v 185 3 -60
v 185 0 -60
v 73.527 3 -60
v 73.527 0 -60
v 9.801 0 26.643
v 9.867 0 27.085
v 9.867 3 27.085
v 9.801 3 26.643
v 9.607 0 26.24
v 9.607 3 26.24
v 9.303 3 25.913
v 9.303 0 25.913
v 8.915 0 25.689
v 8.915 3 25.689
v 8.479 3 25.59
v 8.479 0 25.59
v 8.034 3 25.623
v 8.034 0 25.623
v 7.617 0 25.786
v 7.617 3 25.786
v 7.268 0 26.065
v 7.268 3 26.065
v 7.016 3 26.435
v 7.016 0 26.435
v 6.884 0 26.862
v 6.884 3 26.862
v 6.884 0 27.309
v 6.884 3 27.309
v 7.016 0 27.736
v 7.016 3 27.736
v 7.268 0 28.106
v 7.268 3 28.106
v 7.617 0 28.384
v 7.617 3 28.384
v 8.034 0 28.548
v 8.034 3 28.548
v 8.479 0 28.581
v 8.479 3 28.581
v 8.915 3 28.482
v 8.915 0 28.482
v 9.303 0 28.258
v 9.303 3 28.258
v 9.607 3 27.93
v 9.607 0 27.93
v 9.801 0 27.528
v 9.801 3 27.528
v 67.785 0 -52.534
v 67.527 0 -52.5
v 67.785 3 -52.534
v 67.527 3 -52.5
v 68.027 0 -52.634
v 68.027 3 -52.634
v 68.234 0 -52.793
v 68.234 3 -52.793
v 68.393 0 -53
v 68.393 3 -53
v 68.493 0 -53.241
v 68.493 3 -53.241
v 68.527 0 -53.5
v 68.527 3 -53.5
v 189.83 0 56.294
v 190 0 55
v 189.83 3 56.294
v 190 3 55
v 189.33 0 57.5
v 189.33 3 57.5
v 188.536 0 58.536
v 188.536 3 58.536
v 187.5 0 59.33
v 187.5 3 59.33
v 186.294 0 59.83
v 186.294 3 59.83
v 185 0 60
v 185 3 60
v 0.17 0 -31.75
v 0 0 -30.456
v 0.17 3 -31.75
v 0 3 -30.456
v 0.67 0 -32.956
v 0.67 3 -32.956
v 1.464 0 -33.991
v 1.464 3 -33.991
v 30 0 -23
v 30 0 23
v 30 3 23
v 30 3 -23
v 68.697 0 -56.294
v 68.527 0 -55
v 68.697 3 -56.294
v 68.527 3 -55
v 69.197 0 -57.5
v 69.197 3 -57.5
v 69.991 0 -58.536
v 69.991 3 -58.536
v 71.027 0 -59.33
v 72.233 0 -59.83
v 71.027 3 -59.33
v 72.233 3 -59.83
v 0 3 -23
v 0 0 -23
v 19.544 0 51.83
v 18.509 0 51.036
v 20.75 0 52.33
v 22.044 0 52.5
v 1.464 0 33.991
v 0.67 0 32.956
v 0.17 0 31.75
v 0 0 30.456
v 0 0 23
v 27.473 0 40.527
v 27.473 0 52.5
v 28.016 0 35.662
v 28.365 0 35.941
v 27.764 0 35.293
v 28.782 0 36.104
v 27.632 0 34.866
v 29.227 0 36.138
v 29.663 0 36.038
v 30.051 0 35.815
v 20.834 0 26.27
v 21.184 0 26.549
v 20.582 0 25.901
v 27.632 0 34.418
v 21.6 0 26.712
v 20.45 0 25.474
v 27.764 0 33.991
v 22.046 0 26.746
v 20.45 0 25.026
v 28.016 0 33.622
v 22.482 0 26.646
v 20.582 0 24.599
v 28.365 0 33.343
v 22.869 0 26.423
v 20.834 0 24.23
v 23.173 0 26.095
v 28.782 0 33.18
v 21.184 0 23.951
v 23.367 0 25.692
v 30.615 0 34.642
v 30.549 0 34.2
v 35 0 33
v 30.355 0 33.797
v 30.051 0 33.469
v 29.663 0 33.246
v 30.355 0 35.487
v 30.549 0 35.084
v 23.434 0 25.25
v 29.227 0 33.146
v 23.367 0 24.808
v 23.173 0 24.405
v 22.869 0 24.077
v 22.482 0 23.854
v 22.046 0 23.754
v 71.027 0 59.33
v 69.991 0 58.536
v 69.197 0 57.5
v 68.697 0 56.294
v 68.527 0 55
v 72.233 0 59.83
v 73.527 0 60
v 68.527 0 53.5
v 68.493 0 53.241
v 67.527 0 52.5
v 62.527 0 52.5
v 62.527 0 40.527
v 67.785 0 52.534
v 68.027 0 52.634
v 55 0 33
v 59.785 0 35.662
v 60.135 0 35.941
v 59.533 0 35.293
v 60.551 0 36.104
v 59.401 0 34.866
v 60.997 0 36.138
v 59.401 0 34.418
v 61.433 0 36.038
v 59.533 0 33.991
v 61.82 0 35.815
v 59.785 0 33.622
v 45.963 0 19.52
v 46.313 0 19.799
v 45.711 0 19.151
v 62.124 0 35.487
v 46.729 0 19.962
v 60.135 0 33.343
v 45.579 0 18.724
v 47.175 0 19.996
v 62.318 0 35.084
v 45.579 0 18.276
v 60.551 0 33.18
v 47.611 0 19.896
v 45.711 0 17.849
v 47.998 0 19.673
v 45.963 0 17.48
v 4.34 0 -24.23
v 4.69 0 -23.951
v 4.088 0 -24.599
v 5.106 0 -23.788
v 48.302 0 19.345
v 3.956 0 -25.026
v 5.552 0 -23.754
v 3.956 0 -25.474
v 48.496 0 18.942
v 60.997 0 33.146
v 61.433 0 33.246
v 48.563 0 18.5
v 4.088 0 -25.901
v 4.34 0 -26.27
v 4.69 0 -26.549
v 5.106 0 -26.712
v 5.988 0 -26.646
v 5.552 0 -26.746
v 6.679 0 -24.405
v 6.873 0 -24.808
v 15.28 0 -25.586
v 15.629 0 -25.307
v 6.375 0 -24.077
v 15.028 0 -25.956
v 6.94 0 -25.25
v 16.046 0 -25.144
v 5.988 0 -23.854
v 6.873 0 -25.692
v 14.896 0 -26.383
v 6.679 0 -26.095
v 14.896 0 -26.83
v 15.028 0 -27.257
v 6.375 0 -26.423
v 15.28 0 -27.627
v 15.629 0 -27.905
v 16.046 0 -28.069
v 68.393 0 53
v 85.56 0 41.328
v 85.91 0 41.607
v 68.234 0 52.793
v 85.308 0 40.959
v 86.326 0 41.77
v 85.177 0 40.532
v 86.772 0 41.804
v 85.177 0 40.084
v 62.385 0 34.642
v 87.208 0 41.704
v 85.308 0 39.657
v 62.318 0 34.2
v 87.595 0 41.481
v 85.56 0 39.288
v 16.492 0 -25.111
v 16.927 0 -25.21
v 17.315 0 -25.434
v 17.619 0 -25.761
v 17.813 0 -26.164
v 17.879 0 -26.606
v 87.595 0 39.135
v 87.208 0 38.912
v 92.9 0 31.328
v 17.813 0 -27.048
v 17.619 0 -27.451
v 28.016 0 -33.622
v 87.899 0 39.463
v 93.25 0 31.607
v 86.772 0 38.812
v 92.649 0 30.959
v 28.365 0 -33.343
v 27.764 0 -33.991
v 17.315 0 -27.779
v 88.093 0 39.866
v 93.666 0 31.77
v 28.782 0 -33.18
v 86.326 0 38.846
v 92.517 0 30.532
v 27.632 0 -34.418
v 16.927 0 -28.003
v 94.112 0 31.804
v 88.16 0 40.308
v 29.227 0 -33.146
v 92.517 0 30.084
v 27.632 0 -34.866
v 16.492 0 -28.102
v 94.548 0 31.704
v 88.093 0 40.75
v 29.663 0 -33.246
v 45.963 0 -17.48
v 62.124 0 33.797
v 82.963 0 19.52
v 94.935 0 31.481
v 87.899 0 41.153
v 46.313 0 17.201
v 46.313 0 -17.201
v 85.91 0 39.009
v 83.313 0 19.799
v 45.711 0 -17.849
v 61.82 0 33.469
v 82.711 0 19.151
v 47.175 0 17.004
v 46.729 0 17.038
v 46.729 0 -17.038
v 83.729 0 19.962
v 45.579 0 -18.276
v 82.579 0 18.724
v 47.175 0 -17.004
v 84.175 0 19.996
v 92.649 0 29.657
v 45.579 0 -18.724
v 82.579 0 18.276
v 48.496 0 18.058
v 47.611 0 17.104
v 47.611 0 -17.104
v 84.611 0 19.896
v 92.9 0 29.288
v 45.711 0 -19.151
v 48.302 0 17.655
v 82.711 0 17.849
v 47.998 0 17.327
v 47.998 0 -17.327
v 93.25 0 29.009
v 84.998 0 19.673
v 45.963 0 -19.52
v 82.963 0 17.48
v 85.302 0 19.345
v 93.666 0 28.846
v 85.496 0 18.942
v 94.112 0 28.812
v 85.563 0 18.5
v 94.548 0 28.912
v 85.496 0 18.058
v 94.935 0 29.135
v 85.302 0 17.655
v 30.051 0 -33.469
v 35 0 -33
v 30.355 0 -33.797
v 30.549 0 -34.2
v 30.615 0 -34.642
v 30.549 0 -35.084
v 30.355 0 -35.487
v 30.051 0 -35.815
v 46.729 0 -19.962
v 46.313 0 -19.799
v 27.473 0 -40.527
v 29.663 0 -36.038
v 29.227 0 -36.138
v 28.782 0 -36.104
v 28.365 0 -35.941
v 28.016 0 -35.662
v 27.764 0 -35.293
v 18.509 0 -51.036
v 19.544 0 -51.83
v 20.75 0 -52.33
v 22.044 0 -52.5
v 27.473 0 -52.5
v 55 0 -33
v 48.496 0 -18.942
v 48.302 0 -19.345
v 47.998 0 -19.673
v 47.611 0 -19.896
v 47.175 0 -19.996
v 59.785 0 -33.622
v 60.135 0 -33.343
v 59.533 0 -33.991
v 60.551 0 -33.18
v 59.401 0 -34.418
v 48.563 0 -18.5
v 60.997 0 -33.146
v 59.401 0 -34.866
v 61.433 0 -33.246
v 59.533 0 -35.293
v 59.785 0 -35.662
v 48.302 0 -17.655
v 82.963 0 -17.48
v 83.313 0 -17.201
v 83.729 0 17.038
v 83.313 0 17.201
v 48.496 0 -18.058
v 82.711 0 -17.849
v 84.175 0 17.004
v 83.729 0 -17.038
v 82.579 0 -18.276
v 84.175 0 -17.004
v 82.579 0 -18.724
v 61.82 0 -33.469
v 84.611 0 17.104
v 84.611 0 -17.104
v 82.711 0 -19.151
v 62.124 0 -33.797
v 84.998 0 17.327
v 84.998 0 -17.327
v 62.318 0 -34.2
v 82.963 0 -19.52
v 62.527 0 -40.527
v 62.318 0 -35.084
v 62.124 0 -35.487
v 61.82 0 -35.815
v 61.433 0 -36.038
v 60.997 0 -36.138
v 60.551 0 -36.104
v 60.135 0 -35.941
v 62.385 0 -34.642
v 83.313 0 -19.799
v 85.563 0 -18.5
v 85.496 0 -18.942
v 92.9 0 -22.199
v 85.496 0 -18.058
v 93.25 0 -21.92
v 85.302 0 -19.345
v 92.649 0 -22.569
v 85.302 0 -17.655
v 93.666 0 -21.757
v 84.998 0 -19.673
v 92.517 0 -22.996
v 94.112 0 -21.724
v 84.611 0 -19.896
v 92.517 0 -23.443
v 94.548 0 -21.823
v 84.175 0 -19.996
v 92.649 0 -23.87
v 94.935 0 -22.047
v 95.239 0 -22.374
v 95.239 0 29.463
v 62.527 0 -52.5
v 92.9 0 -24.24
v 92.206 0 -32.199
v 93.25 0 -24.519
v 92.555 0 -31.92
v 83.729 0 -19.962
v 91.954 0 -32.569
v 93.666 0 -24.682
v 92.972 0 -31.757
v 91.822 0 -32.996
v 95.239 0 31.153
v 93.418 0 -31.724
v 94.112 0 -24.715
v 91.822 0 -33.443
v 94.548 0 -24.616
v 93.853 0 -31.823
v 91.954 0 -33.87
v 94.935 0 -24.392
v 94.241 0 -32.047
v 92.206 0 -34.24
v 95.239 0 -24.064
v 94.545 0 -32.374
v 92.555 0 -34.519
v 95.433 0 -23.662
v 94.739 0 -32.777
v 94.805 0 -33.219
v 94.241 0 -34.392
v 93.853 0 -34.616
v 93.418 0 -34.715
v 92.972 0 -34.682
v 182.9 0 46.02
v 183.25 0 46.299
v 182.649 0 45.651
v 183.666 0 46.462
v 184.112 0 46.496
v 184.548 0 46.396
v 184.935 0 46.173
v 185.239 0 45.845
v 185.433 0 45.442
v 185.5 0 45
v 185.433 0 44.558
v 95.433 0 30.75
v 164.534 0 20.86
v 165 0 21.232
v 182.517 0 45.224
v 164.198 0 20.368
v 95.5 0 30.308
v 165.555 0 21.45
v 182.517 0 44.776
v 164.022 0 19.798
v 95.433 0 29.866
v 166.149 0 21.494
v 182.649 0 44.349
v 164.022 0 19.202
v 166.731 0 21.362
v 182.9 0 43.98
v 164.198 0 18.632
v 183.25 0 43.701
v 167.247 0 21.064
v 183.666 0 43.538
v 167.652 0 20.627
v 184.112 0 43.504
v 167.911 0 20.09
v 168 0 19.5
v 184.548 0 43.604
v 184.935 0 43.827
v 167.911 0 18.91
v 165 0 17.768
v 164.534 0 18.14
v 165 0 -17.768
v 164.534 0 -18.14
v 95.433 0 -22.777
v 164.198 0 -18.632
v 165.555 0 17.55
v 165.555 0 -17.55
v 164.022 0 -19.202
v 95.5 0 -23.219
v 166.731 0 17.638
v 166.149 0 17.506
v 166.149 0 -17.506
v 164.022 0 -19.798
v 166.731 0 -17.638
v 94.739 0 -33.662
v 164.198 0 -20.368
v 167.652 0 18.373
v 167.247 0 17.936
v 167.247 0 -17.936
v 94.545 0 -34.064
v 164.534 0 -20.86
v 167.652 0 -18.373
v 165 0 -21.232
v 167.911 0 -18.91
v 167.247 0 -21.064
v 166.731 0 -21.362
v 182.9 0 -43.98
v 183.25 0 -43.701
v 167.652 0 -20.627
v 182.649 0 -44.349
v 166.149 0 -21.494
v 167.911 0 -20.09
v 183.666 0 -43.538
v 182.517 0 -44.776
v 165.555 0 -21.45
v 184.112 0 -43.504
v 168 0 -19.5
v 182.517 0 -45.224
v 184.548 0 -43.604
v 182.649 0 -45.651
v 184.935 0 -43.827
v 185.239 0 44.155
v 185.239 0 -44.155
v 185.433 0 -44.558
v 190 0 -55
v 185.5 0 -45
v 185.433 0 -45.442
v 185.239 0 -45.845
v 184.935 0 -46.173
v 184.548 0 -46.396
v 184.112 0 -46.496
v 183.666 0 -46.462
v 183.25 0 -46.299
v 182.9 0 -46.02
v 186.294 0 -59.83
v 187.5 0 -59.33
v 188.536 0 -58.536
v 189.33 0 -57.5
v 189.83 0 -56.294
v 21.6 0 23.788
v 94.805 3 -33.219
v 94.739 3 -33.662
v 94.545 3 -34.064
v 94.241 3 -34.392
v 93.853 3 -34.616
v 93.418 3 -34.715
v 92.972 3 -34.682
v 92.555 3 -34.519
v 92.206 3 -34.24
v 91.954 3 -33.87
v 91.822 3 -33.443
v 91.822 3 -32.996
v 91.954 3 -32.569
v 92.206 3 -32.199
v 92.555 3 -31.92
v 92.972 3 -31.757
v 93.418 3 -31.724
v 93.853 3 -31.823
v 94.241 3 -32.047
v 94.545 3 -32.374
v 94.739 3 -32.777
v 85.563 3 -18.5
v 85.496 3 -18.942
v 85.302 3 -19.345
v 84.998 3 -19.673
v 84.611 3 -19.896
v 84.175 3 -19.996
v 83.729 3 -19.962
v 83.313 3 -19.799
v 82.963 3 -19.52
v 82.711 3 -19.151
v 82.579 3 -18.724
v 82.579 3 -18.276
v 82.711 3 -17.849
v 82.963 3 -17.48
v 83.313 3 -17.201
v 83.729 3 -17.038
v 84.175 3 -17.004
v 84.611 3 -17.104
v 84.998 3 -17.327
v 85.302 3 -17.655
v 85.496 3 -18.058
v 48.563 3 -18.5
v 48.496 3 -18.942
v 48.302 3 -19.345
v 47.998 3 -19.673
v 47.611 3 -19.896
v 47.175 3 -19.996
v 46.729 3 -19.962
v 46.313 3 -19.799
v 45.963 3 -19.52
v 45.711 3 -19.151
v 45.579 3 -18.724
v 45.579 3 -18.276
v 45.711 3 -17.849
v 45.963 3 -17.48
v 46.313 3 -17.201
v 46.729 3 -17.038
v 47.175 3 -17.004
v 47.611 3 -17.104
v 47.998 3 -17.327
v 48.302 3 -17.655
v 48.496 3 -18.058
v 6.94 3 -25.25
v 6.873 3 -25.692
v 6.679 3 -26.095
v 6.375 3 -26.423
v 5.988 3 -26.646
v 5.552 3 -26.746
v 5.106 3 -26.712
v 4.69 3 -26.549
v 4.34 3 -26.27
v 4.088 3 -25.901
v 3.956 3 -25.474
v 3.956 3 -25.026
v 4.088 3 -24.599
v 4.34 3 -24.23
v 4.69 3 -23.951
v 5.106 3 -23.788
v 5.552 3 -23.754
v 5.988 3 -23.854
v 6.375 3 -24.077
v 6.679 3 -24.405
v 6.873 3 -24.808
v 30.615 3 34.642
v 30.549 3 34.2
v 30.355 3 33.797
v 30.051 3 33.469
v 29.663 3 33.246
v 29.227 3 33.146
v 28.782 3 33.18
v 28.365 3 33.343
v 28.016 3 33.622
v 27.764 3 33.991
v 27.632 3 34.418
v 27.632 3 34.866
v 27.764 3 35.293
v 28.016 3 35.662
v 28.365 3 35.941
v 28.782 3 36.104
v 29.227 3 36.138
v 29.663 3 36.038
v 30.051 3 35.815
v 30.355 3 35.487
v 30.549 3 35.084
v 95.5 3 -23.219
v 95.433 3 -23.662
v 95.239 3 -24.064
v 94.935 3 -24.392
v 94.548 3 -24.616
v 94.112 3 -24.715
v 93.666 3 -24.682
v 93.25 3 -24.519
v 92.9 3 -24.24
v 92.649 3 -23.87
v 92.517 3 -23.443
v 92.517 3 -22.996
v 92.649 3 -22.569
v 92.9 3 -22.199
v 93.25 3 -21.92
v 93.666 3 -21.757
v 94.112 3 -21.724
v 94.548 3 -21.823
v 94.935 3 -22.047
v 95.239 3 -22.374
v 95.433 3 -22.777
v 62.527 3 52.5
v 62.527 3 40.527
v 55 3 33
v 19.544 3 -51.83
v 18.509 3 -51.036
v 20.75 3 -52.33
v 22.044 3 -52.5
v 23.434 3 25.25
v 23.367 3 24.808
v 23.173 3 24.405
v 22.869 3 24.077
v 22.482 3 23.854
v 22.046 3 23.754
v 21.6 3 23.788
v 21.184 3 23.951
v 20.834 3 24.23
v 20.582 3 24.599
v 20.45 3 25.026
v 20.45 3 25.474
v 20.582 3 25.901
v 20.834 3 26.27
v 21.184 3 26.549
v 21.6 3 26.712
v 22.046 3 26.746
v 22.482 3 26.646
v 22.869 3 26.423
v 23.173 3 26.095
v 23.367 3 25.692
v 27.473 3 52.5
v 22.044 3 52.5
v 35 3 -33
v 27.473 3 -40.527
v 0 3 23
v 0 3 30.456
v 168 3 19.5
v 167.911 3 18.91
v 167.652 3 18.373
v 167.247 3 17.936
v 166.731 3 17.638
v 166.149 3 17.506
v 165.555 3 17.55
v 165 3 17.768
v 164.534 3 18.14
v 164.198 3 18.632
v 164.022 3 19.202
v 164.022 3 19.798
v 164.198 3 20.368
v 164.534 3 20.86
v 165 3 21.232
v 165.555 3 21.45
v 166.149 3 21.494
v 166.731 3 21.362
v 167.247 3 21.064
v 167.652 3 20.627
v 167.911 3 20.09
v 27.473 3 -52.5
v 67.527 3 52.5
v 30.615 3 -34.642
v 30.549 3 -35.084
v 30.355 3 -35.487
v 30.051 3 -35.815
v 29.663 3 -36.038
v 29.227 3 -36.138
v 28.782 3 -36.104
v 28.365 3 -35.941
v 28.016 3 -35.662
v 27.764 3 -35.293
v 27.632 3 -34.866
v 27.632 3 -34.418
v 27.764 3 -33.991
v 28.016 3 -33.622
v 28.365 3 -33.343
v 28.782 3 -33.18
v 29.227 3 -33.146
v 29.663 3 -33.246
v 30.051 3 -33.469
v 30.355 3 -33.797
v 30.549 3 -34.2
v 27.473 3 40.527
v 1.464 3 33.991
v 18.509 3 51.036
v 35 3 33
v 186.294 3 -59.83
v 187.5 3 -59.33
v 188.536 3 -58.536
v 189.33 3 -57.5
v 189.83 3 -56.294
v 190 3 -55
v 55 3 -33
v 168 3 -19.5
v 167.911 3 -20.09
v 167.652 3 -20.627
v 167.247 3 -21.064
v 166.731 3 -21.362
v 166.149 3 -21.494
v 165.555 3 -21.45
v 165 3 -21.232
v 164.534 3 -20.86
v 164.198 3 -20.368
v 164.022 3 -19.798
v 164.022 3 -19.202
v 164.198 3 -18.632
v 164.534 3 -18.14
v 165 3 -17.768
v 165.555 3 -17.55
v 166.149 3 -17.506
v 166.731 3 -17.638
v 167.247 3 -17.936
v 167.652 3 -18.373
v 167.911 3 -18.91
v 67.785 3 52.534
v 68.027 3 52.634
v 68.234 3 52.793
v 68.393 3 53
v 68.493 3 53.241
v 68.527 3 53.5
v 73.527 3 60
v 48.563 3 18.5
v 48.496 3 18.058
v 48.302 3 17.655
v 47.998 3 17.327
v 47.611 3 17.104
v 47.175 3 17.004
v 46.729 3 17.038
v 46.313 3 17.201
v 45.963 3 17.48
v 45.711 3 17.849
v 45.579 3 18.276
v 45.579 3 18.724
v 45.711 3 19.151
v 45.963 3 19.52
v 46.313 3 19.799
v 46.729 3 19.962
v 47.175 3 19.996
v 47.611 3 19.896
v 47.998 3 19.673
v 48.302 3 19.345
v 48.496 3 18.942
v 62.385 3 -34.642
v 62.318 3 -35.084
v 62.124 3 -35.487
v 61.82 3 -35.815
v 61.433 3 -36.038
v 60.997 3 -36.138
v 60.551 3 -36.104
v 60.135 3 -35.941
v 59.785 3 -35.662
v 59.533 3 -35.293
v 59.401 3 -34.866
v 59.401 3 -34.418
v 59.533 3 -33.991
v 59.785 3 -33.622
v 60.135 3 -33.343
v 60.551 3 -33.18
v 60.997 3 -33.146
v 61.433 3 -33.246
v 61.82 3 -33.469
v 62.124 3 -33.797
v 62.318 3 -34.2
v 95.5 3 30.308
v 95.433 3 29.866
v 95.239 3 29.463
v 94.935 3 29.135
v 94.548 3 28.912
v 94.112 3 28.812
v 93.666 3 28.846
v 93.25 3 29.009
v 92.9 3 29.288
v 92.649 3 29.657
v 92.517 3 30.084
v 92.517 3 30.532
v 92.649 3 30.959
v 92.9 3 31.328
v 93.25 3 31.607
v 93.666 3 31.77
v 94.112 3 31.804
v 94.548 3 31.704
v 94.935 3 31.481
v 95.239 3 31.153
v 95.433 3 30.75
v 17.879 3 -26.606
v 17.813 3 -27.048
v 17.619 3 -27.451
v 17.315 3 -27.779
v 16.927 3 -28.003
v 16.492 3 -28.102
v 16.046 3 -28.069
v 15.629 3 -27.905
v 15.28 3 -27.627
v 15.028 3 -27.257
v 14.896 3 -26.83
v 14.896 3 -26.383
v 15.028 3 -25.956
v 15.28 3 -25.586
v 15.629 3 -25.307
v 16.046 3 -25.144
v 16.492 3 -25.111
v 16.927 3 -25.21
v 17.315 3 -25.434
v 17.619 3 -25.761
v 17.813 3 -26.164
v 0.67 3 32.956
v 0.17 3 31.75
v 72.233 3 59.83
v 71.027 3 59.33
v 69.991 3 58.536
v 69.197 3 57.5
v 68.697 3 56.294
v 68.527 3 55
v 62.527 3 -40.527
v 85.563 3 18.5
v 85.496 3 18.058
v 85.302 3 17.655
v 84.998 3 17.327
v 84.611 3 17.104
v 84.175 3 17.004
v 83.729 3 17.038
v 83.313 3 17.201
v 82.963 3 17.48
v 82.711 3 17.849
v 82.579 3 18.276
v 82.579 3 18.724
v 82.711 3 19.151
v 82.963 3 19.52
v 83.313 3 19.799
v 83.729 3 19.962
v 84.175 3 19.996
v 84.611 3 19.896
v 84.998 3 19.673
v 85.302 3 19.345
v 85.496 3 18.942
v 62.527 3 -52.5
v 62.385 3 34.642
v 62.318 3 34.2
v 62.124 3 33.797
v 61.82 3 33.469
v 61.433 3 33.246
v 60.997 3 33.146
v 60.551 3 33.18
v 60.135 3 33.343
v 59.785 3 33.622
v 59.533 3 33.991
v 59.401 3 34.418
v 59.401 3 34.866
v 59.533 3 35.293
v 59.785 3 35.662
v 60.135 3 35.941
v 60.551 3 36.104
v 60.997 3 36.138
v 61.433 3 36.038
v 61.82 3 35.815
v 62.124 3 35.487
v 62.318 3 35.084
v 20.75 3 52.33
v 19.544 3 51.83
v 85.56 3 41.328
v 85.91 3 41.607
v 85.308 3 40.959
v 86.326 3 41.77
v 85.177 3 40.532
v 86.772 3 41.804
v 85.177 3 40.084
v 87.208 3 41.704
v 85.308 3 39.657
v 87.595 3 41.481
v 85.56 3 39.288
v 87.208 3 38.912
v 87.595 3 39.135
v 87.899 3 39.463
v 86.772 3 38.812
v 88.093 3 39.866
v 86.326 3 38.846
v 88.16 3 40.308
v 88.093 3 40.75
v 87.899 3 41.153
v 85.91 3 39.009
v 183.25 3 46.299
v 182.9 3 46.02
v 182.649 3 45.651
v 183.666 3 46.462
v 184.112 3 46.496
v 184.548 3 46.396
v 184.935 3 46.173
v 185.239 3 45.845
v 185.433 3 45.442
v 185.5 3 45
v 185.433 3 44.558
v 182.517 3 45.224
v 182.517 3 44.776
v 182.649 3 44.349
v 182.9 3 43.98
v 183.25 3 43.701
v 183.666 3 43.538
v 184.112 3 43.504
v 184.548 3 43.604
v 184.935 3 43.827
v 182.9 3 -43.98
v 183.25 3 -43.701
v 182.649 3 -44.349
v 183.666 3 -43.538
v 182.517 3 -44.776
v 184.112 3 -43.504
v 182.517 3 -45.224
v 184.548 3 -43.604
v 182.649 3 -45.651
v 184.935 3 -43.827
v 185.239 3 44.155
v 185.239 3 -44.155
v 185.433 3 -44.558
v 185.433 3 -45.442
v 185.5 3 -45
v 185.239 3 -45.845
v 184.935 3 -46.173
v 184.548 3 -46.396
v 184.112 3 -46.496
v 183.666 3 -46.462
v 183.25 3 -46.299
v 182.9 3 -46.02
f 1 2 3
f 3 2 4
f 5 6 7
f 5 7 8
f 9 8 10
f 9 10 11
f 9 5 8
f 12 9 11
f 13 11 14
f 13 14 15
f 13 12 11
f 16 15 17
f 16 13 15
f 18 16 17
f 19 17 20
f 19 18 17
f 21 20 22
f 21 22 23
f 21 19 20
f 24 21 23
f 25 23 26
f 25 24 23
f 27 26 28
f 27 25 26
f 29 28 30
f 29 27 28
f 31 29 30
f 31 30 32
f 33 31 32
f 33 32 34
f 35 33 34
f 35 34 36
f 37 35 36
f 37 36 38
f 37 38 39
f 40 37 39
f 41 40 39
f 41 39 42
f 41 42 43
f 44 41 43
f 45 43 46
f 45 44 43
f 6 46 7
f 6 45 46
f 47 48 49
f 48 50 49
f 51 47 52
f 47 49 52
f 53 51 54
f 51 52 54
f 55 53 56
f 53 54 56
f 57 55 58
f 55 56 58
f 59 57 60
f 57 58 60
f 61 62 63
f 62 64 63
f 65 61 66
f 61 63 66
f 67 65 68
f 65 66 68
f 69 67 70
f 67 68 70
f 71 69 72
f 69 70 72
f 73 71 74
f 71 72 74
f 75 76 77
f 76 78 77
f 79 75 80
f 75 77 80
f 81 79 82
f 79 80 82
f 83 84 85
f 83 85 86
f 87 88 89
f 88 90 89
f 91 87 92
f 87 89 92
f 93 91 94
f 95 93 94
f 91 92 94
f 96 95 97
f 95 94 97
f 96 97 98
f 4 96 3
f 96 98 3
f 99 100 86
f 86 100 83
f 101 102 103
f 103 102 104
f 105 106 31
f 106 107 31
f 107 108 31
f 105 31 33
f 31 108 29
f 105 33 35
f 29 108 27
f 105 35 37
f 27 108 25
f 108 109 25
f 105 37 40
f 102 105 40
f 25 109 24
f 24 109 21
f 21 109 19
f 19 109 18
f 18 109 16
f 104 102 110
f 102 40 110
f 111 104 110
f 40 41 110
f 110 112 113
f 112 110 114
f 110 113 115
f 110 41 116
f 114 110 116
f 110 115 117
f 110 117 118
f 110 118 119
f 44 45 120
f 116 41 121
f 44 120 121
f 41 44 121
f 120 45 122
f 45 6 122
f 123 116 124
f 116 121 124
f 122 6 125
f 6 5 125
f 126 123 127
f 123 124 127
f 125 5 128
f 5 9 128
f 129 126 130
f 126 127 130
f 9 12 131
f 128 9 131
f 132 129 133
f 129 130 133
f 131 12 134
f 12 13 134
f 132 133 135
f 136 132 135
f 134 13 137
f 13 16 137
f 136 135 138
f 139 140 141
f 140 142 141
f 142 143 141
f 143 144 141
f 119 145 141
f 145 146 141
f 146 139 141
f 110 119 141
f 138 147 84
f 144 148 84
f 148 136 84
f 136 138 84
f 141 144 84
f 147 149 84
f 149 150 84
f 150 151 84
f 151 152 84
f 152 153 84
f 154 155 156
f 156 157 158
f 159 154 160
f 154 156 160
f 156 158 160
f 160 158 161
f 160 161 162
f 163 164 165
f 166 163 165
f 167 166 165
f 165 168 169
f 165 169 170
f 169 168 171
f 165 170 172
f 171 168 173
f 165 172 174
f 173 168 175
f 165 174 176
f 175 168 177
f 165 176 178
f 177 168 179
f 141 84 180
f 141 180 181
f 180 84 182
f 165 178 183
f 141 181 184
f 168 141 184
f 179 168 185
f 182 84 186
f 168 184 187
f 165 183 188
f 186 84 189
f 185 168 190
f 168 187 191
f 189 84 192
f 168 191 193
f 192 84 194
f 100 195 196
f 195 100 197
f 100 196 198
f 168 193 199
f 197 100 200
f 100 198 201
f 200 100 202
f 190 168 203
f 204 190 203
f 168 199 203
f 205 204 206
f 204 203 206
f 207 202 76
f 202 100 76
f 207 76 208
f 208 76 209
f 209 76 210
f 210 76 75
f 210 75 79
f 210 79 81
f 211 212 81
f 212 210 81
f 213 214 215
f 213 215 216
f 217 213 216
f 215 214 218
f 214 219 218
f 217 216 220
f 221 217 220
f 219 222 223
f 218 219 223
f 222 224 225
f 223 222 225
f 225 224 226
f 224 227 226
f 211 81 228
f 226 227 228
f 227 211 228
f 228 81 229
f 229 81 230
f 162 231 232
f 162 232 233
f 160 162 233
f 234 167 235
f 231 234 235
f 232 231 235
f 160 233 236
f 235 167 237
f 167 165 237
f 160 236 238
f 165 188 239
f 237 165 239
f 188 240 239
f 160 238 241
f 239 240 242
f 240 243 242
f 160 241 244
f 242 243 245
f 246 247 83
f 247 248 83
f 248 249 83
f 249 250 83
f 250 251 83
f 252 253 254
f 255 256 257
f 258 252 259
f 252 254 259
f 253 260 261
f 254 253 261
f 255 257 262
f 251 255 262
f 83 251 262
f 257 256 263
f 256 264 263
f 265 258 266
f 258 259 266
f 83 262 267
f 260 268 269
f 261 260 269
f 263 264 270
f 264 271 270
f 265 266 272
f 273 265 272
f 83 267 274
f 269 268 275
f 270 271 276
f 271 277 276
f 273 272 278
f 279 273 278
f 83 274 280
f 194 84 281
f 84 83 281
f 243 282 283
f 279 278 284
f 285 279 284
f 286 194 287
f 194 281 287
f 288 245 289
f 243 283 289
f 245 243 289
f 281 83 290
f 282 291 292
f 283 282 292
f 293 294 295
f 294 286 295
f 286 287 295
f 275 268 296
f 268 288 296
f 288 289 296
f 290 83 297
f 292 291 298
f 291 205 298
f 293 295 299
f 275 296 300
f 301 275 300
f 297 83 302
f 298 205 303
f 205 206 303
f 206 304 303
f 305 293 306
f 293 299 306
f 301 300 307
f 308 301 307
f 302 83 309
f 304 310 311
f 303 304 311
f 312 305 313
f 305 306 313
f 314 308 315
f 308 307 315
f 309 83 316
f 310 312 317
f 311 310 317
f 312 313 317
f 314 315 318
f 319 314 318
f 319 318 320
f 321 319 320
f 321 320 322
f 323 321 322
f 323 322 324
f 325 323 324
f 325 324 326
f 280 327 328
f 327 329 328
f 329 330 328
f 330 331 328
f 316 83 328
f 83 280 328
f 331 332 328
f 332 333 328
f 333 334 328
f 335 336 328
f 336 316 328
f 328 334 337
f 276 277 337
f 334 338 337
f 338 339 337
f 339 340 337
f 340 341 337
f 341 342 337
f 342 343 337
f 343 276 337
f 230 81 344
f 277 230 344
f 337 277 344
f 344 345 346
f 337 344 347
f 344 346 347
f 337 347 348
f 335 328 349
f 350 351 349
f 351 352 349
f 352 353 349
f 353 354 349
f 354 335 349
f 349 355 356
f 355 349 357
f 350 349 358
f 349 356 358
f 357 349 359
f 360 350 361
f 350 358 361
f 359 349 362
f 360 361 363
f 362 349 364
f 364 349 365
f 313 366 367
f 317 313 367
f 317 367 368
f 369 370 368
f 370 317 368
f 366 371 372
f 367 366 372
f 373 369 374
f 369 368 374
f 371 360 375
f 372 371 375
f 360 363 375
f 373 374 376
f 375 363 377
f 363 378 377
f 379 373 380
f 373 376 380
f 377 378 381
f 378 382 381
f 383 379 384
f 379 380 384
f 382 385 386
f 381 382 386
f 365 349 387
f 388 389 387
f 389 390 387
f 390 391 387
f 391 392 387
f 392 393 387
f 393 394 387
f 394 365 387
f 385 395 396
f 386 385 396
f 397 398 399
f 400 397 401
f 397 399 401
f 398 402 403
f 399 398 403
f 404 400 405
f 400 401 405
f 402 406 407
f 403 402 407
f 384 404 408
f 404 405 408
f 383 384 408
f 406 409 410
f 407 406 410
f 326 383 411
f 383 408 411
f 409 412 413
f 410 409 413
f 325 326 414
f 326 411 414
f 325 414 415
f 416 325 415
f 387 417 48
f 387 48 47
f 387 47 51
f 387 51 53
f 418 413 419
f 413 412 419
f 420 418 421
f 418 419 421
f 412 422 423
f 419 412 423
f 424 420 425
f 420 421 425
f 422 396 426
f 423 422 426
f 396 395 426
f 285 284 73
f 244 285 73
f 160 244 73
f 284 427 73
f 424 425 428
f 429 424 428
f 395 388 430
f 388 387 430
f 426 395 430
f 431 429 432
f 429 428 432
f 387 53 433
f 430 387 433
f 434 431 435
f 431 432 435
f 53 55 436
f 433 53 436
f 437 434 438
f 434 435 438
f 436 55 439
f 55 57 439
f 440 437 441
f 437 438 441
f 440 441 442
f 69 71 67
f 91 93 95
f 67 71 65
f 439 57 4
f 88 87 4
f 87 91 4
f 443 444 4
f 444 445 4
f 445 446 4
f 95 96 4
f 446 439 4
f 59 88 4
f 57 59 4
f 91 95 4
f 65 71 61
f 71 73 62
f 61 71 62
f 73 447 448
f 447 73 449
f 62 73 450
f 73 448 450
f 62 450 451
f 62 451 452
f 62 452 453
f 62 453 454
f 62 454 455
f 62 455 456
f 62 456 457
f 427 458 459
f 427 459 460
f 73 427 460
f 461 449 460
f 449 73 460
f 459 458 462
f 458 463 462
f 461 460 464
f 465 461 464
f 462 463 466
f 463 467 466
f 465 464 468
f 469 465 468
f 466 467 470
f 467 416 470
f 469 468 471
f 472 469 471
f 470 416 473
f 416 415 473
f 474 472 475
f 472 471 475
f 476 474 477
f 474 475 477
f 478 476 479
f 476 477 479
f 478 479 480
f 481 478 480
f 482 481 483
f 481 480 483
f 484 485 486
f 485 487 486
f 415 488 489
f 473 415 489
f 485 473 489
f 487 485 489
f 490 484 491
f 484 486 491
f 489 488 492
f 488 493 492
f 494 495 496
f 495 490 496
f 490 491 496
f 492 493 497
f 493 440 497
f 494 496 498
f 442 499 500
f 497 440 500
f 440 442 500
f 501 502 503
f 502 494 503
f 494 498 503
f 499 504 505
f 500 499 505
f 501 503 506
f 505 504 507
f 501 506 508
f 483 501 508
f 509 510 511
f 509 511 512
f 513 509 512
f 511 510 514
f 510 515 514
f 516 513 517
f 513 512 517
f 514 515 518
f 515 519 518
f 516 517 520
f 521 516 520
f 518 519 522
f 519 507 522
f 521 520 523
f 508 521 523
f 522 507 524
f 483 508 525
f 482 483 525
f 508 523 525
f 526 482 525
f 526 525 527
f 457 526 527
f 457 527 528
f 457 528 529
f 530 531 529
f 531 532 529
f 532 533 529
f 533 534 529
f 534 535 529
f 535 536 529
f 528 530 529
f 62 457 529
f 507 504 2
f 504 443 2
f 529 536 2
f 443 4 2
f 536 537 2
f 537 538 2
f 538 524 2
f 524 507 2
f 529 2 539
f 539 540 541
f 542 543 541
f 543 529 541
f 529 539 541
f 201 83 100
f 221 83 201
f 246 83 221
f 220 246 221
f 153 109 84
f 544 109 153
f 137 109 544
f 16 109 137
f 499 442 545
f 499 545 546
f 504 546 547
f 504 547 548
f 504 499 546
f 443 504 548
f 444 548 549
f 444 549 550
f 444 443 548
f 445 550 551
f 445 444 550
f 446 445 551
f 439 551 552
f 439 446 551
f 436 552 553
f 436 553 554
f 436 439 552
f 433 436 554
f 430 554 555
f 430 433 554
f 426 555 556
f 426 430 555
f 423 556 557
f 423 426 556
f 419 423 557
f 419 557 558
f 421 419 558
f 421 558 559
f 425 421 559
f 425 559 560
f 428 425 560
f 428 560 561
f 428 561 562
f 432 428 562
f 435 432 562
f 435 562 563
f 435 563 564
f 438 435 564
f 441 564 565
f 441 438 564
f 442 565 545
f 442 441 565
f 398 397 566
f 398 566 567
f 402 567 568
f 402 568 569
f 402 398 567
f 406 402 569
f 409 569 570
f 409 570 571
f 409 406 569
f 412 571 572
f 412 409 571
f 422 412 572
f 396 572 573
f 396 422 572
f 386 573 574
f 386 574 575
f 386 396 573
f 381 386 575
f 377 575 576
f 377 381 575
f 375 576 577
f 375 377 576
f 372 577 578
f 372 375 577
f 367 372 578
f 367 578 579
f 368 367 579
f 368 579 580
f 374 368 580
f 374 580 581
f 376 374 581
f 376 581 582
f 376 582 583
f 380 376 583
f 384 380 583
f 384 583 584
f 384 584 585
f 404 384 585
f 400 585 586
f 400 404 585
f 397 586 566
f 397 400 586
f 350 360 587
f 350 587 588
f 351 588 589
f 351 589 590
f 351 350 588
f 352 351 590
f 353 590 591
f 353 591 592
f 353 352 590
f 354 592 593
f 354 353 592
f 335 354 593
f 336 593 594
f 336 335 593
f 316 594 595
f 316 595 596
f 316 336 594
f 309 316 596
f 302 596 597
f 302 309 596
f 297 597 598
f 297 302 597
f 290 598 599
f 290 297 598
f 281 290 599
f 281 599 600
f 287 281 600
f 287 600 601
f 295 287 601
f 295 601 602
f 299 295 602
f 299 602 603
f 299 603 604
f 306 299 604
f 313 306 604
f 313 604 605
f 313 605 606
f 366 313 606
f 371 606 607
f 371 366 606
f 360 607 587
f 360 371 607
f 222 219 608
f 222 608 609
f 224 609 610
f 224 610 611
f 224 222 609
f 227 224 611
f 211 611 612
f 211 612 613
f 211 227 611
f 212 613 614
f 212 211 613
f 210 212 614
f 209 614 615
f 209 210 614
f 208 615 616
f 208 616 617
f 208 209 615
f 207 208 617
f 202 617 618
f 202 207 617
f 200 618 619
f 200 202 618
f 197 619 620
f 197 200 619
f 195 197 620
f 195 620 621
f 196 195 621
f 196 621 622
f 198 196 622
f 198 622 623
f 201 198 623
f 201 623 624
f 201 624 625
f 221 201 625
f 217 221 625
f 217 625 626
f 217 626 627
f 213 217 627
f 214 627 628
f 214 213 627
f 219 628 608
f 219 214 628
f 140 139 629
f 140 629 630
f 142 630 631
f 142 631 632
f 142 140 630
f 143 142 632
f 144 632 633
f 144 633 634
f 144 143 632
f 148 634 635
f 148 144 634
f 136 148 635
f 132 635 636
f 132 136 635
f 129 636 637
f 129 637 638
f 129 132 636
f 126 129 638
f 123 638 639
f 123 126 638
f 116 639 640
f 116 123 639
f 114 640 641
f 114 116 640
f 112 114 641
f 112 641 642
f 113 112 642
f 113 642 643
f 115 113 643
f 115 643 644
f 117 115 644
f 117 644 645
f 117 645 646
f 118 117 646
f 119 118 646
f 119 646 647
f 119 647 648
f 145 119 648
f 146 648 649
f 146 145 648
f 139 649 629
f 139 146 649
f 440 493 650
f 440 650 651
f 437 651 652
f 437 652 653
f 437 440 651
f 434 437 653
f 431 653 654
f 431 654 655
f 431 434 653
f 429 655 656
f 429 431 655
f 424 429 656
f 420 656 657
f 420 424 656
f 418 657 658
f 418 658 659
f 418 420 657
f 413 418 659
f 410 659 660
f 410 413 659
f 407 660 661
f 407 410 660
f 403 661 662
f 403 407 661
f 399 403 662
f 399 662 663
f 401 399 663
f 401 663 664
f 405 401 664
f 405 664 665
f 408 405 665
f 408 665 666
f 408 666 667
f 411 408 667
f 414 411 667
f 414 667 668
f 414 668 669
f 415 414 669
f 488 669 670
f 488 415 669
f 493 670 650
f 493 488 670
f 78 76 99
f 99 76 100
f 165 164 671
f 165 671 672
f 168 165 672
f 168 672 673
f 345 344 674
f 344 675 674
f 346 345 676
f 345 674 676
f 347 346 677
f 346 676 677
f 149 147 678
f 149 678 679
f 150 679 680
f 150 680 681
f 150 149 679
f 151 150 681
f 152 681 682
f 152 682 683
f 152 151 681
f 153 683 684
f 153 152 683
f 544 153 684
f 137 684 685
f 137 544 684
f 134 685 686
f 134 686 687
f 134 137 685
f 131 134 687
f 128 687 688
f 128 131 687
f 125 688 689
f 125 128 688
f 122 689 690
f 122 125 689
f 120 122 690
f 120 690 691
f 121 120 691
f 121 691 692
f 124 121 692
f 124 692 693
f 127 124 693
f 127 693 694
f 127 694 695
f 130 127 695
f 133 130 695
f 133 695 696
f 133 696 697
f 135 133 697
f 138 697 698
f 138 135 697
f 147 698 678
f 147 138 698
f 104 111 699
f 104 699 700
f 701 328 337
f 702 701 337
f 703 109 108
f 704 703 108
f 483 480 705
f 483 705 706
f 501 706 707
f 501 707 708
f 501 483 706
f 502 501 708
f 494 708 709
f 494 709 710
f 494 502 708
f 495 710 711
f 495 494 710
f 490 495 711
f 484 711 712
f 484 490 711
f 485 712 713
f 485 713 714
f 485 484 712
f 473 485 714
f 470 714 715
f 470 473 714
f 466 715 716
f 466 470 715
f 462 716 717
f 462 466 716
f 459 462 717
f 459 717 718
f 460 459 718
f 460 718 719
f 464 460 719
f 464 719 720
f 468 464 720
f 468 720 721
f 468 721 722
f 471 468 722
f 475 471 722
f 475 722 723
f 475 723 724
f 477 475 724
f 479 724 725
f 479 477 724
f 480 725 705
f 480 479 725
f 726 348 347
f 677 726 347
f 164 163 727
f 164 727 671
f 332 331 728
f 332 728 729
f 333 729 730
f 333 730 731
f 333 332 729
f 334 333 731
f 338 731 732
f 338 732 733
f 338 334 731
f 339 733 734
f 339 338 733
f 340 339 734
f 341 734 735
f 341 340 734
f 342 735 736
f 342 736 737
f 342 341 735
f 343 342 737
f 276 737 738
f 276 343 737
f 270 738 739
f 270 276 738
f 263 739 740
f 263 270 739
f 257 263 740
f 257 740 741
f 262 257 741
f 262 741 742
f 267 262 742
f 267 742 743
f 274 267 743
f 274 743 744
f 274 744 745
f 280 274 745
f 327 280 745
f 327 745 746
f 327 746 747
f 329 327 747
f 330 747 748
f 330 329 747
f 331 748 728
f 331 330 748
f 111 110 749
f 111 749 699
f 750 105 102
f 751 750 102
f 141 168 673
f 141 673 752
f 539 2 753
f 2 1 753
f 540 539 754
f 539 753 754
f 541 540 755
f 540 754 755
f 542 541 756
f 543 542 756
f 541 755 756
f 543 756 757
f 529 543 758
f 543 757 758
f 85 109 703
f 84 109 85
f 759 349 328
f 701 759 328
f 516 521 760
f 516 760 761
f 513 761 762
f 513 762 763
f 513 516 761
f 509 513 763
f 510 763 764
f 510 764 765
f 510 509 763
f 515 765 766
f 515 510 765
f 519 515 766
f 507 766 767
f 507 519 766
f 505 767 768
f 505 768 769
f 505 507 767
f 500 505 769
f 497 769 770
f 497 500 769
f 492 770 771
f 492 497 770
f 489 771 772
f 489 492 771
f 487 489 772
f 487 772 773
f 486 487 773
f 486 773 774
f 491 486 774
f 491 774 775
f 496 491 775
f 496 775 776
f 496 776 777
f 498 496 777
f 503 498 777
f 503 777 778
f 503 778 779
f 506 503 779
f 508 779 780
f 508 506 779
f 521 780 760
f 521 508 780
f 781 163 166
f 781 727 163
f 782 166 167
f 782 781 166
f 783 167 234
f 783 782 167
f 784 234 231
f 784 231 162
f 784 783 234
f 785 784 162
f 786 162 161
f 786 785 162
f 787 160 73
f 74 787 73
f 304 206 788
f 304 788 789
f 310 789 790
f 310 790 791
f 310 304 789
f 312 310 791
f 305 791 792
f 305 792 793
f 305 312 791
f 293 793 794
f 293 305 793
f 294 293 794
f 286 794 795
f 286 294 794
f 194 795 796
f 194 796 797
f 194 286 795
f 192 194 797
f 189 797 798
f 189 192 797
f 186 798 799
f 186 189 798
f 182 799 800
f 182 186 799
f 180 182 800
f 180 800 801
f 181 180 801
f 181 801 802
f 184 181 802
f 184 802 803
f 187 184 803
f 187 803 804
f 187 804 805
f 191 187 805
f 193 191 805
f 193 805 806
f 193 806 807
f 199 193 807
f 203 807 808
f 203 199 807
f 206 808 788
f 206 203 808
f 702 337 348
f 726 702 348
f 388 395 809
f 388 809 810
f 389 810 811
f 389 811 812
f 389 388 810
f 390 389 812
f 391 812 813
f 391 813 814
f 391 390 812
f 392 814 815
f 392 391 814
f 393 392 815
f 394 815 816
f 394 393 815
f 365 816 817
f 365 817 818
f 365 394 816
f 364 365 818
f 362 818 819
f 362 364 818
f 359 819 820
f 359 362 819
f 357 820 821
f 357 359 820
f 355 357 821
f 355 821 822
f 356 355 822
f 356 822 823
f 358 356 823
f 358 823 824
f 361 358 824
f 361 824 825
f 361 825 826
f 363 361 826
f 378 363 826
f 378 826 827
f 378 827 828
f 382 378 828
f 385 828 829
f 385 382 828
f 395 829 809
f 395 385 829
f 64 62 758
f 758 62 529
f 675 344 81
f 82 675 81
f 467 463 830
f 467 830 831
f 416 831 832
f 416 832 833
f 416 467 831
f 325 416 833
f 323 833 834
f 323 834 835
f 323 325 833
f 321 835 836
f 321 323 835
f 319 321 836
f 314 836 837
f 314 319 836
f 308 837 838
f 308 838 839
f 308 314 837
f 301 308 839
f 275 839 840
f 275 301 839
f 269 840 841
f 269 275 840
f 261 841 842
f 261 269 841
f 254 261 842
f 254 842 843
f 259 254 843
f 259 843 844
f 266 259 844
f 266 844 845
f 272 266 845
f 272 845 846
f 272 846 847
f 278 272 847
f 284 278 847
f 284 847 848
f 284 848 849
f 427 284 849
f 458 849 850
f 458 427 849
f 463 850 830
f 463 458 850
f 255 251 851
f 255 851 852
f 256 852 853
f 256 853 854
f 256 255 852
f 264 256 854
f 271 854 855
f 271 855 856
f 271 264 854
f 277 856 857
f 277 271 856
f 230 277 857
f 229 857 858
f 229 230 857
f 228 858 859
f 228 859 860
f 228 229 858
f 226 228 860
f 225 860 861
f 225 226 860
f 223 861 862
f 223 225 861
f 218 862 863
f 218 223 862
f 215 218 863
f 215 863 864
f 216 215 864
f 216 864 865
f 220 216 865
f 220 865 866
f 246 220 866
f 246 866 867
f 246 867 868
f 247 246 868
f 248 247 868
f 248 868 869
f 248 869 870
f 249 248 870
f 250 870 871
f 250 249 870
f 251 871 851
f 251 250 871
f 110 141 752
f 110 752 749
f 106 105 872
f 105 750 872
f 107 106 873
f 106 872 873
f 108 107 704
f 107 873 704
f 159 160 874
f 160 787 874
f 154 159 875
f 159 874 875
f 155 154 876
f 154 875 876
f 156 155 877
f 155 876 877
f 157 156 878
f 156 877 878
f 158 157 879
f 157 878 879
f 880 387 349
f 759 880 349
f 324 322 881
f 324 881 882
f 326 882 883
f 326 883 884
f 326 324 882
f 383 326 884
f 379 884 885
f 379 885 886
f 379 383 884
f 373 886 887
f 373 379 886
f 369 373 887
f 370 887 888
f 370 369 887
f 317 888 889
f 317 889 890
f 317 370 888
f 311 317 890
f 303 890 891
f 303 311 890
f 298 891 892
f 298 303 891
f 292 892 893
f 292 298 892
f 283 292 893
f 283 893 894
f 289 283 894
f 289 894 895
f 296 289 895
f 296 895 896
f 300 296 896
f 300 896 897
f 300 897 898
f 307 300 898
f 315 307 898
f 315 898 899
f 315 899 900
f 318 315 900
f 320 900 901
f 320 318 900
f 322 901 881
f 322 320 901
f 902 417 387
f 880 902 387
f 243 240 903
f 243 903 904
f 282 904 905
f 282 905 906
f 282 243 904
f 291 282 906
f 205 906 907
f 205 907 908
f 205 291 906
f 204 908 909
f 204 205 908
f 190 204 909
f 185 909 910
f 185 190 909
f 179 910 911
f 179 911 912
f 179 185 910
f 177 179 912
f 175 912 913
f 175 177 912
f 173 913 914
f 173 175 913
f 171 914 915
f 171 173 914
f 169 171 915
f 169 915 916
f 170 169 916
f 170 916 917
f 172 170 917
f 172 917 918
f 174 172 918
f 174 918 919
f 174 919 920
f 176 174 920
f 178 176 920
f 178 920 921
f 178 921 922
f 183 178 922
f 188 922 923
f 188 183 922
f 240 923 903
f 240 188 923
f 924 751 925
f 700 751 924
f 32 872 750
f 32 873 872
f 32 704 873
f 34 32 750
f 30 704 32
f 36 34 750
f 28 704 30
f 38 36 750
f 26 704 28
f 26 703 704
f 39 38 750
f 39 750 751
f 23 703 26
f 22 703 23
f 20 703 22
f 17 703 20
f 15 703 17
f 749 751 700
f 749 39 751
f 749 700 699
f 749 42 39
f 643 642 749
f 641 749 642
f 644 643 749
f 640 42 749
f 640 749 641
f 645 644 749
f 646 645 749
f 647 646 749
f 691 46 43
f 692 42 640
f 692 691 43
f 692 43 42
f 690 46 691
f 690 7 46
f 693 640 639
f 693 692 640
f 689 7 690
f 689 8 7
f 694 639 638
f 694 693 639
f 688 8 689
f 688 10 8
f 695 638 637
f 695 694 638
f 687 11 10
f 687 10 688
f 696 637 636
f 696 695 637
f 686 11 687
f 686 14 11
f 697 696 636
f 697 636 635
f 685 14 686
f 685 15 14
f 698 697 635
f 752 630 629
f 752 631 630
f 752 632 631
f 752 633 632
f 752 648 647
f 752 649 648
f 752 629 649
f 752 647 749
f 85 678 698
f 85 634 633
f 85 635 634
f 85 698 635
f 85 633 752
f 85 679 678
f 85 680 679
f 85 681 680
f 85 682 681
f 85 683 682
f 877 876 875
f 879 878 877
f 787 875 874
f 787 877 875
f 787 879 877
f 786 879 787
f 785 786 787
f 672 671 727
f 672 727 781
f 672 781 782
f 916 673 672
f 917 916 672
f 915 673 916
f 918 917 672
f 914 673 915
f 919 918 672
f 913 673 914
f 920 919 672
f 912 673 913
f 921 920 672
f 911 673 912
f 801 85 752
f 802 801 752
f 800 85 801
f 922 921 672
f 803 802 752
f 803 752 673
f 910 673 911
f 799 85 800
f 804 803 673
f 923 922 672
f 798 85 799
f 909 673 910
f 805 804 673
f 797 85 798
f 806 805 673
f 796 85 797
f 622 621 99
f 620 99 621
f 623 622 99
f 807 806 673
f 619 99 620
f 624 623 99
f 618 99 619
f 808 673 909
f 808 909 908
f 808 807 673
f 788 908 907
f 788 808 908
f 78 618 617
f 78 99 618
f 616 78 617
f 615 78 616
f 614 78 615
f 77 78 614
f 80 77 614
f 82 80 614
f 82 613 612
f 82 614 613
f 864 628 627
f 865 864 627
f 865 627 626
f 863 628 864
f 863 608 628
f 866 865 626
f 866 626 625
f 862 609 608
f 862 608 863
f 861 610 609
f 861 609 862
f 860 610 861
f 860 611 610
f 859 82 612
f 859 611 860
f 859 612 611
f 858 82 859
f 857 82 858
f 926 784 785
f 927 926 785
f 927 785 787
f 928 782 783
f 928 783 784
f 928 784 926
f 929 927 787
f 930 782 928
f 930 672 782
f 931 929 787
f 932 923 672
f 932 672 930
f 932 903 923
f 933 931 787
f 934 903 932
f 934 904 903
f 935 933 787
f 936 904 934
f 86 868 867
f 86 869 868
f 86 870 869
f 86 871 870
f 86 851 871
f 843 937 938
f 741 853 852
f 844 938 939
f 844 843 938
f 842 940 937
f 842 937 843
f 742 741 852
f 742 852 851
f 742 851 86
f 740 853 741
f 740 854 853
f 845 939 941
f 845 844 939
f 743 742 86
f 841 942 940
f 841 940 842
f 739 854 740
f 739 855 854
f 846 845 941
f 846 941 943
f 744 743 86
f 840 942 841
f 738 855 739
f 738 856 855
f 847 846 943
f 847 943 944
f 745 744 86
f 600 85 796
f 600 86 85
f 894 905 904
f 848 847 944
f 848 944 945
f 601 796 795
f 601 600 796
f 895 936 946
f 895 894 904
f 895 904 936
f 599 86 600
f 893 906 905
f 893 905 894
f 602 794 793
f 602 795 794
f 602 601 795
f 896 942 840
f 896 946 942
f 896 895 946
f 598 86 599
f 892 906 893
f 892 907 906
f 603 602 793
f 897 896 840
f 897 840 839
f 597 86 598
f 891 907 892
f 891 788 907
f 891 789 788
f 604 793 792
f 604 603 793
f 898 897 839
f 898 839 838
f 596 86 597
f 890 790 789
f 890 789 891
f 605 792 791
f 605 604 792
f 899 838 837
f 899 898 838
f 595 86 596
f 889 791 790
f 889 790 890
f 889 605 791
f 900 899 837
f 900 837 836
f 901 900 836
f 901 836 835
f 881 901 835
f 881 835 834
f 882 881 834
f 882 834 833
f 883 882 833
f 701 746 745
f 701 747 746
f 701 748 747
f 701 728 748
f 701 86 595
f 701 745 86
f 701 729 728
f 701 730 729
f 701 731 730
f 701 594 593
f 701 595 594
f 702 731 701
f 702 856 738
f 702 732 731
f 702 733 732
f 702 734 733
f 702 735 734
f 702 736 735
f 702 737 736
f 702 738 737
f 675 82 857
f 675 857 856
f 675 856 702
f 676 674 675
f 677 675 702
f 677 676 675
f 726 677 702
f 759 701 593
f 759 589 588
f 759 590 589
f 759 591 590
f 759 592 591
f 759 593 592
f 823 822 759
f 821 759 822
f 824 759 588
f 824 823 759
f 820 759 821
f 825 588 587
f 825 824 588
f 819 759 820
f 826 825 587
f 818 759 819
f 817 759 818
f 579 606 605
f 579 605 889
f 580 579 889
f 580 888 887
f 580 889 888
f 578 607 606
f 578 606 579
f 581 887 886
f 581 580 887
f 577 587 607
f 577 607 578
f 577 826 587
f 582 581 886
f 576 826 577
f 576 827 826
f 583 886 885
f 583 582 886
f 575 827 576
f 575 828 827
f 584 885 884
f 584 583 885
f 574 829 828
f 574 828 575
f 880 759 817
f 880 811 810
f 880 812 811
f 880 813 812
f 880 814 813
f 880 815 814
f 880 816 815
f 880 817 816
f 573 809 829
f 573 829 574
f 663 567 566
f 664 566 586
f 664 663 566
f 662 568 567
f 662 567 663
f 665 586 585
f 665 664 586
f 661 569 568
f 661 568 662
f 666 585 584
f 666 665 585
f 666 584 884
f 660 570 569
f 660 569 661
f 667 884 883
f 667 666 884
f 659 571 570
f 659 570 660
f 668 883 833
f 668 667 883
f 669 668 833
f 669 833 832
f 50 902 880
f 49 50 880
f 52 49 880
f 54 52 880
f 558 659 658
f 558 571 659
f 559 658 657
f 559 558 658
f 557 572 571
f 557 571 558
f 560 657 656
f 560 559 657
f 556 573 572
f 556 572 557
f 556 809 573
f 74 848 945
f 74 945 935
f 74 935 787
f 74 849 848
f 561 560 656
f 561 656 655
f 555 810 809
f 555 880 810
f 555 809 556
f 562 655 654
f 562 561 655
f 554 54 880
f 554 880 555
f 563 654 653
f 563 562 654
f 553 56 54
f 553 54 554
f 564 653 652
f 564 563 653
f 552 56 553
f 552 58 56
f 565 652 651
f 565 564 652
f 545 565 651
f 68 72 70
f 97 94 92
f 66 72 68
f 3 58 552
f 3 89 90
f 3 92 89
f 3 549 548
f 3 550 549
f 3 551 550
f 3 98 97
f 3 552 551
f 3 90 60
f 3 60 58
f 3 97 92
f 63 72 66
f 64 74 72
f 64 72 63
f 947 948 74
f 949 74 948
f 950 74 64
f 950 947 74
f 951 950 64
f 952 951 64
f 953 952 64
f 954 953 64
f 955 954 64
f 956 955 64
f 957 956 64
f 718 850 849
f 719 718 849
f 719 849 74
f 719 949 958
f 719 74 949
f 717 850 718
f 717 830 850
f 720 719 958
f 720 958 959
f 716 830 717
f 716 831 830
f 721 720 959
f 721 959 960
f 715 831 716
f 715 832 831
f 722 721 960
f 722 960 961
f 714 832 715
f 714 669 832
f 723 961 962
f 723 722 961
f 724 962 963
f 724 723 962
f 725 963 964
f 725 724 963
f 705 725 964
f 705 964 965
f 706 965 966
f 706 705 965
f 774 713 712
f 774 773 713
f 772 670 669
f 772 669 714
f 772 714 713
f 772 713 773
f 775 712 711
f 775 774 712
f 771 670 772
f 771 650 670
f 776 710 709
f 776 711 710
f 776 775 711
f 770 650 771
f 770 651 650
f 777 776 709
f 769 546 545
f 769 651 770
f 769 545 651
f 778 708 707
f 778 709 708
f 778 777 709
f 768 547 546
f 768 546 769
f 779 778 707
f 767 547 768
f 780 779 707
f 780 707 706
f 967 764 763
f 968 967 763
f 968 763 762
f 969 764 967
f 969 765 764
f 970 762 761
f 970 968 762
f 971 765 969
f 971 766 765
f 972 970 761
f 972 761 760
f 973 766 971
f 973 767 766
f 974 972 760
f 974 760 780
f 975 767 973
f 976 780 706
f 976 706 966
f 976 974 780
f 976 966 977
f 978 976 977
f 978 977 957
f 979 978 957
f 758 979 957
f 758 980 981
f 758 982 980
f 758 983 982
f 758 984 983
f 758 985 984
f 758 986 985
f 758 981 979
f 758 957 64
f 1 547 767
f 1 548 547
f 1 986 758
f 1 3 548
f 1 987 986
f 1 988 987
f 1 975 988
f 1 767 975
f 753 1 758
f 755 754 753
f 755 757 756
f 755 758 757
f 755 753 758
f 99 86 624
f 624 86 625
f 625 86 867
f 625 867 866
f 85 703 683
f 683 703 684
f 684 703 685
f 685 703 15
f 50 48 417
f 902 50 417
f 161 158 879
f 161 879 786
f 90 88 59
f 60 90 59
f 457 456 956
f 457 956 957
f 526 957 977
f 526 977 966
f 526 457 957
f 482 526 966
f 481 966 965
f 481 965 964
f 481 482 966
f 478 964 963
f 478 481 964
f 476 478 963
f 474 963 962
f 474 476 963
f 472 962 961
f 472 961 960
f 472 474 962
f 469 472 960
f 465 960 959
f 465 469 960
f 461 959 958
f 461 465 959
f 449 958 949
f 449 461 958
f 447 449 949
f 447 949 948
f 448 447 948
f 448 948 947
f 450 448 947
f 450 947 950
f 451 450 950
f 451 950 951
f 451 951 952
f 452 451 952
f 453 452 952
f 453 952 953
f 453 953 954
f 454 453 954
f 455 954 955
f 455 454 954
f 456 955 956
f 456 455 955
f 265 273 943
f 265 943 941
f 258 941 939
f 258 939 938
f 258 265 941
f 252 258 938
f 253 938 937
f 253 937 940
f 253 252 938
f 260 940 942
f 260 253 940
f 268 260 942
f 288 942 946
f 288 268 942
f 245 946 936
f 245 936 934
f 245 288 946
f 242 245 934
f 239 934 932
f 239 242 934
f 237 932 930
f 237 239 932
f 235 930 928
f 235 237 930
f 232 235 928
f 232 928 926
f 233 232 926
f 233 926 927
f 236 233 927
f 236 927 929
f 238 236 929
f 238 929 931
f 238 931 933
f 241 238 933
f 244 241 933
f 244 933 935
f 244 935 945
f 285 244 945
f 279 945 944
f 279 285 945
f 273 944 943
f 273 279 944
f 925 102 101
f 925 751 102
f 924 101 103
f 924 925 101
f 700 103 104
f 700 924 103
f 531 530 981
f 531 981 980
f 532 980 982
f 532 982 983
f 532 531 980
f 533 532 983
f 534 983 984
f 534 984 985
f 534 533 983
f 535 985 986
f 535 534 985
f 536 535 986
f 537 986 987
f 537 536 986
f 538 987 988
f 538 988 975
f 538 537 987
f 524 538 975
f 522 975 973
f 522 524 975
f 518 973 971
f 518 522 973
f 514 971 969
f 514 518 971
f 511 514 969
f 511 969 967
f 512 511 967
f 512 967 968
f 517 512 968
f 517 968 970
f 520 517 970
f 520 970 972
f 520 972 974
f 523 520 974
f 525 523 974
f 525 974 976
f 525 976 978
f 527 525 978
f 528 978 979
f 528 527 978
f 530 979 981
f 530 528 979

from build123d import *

# Parameters (mm, degrees)
BOSS_EXTRUDE1_DEPTH = 3
SKETCH4_W           = 30
SKETCH4_H           = 46
CUT_EXTRUDE1_DEPTH  = 3
FILLET1_R           = 5
FILLET2_R           = 1
SKETCH5_R           = 1.5
SKETCH5_R_2         = 2
CUT_EXTRUDE2_DEPTH  = 3


with BuildPart() as part:
    # Sketch1 → Boss-Extrude1 (new body)
    with BuildSketch(Plane(origin=(0, 0, 0), x_dir=(1, 0, 0), z_dir=(0, 1, 0))):
        Polygon((0, -32.526631134), (27.473368866, -60), (190, -60), (190, 60), (27.473368866, 60), (0, 32.526631134), (0, 23), (0, -23), align=None)
    extrude(amount=BOSS_EXTRUDE1_DEPTH)

    # Sketch4 → Cut-Extrude1 (cut)
    with BuildSketch(Plane(origin=(0, 0, 0), x_dir=(1, 0, 0), z_dir=(0, 1, 0))):
        Polygon((68.526631134, -60), (68.526631134, -52.5), (62.526631134, -52.5), (62.526631134, -40.526631134), (55, -33), (35, -33), (27.473368866, -40.526631134), (27.473368866, -52.5), (19.973368866, -52.5), (27.473368866, -60), align=None)
        Polygon((27.473368866, 60), (68.526631134, 60), (68.526631134, 52.5), (62.526631134, 52.5), (62.526631134, 40.526631134), (55, 33), (35, 33), (27.473368866, 40.526631134), (27.473368866, 52.5), (19.973368866, 52.5), align=None)
        with Locations((15, 0)):
            Rectangle(SKETCH4_W, SKETCH4_H)
    extrude(amount=CUT_EXTRUDE1_DEPTH, mode=Mode.SUBTRACT)

    # Fillet1
    fillet1_edges = [part.edges().sort_by_distance(p)[0] for p in [
        (190, 1.5, -60),
        (190, 1.5, 60),
        (0, 1.5, 32.526631134),
        (0, 1.5, -32.526631134),
        (68.526631134, 1.5, 60),
        (19.973368866, 1.5, 52.5),
        (19.973368866, 1.5, -52.5),
        (68.526631134, 1.5, -60),
    ]]
    fillet(fillet1_edges, radius=FILLET1_R)

    # Fillet2
    fillet2_edges = [part.edges().sort_by_distance(p)[0] for p in [
        (68.526631134, 1.5, 52.5),
        (68.526631134, 1.5, -52.5),
    ]]
    fillet(fillet2_edges, radius=FILLET2_R)

    # Sketch5 → Cut-Extrude2 (cut)
    with BuildSketch(Plane(origin=(0, 0, 0), x_dir=(1, 0, 0), z_dir=(0, 1, 0))):
        with Locations((47.062554885, -18.5)):
            Circle(SKETCH5_R)
        with Locations((84.062554885, -18.5)):
            Circle(SKETCH5_R)
        with Locations((84.062554885, 18.5)):
            Circle(SKETCH5_R)
        with Locations((47.062554885, 18.5)):
            Circle(SKETCH5_R)
        with Locations((94, 23.219474586)):
            Circle(SKETCH5_R)
        with Locations((93.305417602, 33.219474586)):
            Circle(SKETCH5_R)
        with Locations((29.11536409, 34.641995223)):
            Circle(SKETCH5_R)
        with Locations((60.88463591, 34.641995223)):
            Circle(SKETCH5_R)
        with Locations((8.367356219, -27.085410895)):
            Circle(SKETCH5_R)
        with Locations((16.379446424, 26.606355181)):
            Circle(SKETCH5_R)
        with Locations((94, -30.308001182)):
            Circle(SKETCH5_R)
        with Locations((86.659783805, -40.308001182)):
            Circle(SKETCH5_R)
        with Locations((184, -45)):
            Circle(SKETCH5_R)
        with Locations((184, 45)):
            Circle(SKETCH5_R)
        with Locations((166, -19.5)):
            Circle(SKETCH5_R_2)
        with Locations((166, 19.5)):
            Circle(SKETCH5_R_2)
        with Locations((29.11536409, -34.641995223)):
            Circle(SKETCH5_R)
        with Locations((60.88463591, -34.641995223)):
            Circle(SKETCH5_R)
        with Locations((21.933678109, -25.25)):
            Circle(SKETCH5_R)
        with Locations((5.439723212, 25.25)):
            Circle(SKETCH5_R)
    extrude(amount=CUT_EXTRUDE2_DEPTH, mode=Mode.SUBTRACT)


solid = part.part
